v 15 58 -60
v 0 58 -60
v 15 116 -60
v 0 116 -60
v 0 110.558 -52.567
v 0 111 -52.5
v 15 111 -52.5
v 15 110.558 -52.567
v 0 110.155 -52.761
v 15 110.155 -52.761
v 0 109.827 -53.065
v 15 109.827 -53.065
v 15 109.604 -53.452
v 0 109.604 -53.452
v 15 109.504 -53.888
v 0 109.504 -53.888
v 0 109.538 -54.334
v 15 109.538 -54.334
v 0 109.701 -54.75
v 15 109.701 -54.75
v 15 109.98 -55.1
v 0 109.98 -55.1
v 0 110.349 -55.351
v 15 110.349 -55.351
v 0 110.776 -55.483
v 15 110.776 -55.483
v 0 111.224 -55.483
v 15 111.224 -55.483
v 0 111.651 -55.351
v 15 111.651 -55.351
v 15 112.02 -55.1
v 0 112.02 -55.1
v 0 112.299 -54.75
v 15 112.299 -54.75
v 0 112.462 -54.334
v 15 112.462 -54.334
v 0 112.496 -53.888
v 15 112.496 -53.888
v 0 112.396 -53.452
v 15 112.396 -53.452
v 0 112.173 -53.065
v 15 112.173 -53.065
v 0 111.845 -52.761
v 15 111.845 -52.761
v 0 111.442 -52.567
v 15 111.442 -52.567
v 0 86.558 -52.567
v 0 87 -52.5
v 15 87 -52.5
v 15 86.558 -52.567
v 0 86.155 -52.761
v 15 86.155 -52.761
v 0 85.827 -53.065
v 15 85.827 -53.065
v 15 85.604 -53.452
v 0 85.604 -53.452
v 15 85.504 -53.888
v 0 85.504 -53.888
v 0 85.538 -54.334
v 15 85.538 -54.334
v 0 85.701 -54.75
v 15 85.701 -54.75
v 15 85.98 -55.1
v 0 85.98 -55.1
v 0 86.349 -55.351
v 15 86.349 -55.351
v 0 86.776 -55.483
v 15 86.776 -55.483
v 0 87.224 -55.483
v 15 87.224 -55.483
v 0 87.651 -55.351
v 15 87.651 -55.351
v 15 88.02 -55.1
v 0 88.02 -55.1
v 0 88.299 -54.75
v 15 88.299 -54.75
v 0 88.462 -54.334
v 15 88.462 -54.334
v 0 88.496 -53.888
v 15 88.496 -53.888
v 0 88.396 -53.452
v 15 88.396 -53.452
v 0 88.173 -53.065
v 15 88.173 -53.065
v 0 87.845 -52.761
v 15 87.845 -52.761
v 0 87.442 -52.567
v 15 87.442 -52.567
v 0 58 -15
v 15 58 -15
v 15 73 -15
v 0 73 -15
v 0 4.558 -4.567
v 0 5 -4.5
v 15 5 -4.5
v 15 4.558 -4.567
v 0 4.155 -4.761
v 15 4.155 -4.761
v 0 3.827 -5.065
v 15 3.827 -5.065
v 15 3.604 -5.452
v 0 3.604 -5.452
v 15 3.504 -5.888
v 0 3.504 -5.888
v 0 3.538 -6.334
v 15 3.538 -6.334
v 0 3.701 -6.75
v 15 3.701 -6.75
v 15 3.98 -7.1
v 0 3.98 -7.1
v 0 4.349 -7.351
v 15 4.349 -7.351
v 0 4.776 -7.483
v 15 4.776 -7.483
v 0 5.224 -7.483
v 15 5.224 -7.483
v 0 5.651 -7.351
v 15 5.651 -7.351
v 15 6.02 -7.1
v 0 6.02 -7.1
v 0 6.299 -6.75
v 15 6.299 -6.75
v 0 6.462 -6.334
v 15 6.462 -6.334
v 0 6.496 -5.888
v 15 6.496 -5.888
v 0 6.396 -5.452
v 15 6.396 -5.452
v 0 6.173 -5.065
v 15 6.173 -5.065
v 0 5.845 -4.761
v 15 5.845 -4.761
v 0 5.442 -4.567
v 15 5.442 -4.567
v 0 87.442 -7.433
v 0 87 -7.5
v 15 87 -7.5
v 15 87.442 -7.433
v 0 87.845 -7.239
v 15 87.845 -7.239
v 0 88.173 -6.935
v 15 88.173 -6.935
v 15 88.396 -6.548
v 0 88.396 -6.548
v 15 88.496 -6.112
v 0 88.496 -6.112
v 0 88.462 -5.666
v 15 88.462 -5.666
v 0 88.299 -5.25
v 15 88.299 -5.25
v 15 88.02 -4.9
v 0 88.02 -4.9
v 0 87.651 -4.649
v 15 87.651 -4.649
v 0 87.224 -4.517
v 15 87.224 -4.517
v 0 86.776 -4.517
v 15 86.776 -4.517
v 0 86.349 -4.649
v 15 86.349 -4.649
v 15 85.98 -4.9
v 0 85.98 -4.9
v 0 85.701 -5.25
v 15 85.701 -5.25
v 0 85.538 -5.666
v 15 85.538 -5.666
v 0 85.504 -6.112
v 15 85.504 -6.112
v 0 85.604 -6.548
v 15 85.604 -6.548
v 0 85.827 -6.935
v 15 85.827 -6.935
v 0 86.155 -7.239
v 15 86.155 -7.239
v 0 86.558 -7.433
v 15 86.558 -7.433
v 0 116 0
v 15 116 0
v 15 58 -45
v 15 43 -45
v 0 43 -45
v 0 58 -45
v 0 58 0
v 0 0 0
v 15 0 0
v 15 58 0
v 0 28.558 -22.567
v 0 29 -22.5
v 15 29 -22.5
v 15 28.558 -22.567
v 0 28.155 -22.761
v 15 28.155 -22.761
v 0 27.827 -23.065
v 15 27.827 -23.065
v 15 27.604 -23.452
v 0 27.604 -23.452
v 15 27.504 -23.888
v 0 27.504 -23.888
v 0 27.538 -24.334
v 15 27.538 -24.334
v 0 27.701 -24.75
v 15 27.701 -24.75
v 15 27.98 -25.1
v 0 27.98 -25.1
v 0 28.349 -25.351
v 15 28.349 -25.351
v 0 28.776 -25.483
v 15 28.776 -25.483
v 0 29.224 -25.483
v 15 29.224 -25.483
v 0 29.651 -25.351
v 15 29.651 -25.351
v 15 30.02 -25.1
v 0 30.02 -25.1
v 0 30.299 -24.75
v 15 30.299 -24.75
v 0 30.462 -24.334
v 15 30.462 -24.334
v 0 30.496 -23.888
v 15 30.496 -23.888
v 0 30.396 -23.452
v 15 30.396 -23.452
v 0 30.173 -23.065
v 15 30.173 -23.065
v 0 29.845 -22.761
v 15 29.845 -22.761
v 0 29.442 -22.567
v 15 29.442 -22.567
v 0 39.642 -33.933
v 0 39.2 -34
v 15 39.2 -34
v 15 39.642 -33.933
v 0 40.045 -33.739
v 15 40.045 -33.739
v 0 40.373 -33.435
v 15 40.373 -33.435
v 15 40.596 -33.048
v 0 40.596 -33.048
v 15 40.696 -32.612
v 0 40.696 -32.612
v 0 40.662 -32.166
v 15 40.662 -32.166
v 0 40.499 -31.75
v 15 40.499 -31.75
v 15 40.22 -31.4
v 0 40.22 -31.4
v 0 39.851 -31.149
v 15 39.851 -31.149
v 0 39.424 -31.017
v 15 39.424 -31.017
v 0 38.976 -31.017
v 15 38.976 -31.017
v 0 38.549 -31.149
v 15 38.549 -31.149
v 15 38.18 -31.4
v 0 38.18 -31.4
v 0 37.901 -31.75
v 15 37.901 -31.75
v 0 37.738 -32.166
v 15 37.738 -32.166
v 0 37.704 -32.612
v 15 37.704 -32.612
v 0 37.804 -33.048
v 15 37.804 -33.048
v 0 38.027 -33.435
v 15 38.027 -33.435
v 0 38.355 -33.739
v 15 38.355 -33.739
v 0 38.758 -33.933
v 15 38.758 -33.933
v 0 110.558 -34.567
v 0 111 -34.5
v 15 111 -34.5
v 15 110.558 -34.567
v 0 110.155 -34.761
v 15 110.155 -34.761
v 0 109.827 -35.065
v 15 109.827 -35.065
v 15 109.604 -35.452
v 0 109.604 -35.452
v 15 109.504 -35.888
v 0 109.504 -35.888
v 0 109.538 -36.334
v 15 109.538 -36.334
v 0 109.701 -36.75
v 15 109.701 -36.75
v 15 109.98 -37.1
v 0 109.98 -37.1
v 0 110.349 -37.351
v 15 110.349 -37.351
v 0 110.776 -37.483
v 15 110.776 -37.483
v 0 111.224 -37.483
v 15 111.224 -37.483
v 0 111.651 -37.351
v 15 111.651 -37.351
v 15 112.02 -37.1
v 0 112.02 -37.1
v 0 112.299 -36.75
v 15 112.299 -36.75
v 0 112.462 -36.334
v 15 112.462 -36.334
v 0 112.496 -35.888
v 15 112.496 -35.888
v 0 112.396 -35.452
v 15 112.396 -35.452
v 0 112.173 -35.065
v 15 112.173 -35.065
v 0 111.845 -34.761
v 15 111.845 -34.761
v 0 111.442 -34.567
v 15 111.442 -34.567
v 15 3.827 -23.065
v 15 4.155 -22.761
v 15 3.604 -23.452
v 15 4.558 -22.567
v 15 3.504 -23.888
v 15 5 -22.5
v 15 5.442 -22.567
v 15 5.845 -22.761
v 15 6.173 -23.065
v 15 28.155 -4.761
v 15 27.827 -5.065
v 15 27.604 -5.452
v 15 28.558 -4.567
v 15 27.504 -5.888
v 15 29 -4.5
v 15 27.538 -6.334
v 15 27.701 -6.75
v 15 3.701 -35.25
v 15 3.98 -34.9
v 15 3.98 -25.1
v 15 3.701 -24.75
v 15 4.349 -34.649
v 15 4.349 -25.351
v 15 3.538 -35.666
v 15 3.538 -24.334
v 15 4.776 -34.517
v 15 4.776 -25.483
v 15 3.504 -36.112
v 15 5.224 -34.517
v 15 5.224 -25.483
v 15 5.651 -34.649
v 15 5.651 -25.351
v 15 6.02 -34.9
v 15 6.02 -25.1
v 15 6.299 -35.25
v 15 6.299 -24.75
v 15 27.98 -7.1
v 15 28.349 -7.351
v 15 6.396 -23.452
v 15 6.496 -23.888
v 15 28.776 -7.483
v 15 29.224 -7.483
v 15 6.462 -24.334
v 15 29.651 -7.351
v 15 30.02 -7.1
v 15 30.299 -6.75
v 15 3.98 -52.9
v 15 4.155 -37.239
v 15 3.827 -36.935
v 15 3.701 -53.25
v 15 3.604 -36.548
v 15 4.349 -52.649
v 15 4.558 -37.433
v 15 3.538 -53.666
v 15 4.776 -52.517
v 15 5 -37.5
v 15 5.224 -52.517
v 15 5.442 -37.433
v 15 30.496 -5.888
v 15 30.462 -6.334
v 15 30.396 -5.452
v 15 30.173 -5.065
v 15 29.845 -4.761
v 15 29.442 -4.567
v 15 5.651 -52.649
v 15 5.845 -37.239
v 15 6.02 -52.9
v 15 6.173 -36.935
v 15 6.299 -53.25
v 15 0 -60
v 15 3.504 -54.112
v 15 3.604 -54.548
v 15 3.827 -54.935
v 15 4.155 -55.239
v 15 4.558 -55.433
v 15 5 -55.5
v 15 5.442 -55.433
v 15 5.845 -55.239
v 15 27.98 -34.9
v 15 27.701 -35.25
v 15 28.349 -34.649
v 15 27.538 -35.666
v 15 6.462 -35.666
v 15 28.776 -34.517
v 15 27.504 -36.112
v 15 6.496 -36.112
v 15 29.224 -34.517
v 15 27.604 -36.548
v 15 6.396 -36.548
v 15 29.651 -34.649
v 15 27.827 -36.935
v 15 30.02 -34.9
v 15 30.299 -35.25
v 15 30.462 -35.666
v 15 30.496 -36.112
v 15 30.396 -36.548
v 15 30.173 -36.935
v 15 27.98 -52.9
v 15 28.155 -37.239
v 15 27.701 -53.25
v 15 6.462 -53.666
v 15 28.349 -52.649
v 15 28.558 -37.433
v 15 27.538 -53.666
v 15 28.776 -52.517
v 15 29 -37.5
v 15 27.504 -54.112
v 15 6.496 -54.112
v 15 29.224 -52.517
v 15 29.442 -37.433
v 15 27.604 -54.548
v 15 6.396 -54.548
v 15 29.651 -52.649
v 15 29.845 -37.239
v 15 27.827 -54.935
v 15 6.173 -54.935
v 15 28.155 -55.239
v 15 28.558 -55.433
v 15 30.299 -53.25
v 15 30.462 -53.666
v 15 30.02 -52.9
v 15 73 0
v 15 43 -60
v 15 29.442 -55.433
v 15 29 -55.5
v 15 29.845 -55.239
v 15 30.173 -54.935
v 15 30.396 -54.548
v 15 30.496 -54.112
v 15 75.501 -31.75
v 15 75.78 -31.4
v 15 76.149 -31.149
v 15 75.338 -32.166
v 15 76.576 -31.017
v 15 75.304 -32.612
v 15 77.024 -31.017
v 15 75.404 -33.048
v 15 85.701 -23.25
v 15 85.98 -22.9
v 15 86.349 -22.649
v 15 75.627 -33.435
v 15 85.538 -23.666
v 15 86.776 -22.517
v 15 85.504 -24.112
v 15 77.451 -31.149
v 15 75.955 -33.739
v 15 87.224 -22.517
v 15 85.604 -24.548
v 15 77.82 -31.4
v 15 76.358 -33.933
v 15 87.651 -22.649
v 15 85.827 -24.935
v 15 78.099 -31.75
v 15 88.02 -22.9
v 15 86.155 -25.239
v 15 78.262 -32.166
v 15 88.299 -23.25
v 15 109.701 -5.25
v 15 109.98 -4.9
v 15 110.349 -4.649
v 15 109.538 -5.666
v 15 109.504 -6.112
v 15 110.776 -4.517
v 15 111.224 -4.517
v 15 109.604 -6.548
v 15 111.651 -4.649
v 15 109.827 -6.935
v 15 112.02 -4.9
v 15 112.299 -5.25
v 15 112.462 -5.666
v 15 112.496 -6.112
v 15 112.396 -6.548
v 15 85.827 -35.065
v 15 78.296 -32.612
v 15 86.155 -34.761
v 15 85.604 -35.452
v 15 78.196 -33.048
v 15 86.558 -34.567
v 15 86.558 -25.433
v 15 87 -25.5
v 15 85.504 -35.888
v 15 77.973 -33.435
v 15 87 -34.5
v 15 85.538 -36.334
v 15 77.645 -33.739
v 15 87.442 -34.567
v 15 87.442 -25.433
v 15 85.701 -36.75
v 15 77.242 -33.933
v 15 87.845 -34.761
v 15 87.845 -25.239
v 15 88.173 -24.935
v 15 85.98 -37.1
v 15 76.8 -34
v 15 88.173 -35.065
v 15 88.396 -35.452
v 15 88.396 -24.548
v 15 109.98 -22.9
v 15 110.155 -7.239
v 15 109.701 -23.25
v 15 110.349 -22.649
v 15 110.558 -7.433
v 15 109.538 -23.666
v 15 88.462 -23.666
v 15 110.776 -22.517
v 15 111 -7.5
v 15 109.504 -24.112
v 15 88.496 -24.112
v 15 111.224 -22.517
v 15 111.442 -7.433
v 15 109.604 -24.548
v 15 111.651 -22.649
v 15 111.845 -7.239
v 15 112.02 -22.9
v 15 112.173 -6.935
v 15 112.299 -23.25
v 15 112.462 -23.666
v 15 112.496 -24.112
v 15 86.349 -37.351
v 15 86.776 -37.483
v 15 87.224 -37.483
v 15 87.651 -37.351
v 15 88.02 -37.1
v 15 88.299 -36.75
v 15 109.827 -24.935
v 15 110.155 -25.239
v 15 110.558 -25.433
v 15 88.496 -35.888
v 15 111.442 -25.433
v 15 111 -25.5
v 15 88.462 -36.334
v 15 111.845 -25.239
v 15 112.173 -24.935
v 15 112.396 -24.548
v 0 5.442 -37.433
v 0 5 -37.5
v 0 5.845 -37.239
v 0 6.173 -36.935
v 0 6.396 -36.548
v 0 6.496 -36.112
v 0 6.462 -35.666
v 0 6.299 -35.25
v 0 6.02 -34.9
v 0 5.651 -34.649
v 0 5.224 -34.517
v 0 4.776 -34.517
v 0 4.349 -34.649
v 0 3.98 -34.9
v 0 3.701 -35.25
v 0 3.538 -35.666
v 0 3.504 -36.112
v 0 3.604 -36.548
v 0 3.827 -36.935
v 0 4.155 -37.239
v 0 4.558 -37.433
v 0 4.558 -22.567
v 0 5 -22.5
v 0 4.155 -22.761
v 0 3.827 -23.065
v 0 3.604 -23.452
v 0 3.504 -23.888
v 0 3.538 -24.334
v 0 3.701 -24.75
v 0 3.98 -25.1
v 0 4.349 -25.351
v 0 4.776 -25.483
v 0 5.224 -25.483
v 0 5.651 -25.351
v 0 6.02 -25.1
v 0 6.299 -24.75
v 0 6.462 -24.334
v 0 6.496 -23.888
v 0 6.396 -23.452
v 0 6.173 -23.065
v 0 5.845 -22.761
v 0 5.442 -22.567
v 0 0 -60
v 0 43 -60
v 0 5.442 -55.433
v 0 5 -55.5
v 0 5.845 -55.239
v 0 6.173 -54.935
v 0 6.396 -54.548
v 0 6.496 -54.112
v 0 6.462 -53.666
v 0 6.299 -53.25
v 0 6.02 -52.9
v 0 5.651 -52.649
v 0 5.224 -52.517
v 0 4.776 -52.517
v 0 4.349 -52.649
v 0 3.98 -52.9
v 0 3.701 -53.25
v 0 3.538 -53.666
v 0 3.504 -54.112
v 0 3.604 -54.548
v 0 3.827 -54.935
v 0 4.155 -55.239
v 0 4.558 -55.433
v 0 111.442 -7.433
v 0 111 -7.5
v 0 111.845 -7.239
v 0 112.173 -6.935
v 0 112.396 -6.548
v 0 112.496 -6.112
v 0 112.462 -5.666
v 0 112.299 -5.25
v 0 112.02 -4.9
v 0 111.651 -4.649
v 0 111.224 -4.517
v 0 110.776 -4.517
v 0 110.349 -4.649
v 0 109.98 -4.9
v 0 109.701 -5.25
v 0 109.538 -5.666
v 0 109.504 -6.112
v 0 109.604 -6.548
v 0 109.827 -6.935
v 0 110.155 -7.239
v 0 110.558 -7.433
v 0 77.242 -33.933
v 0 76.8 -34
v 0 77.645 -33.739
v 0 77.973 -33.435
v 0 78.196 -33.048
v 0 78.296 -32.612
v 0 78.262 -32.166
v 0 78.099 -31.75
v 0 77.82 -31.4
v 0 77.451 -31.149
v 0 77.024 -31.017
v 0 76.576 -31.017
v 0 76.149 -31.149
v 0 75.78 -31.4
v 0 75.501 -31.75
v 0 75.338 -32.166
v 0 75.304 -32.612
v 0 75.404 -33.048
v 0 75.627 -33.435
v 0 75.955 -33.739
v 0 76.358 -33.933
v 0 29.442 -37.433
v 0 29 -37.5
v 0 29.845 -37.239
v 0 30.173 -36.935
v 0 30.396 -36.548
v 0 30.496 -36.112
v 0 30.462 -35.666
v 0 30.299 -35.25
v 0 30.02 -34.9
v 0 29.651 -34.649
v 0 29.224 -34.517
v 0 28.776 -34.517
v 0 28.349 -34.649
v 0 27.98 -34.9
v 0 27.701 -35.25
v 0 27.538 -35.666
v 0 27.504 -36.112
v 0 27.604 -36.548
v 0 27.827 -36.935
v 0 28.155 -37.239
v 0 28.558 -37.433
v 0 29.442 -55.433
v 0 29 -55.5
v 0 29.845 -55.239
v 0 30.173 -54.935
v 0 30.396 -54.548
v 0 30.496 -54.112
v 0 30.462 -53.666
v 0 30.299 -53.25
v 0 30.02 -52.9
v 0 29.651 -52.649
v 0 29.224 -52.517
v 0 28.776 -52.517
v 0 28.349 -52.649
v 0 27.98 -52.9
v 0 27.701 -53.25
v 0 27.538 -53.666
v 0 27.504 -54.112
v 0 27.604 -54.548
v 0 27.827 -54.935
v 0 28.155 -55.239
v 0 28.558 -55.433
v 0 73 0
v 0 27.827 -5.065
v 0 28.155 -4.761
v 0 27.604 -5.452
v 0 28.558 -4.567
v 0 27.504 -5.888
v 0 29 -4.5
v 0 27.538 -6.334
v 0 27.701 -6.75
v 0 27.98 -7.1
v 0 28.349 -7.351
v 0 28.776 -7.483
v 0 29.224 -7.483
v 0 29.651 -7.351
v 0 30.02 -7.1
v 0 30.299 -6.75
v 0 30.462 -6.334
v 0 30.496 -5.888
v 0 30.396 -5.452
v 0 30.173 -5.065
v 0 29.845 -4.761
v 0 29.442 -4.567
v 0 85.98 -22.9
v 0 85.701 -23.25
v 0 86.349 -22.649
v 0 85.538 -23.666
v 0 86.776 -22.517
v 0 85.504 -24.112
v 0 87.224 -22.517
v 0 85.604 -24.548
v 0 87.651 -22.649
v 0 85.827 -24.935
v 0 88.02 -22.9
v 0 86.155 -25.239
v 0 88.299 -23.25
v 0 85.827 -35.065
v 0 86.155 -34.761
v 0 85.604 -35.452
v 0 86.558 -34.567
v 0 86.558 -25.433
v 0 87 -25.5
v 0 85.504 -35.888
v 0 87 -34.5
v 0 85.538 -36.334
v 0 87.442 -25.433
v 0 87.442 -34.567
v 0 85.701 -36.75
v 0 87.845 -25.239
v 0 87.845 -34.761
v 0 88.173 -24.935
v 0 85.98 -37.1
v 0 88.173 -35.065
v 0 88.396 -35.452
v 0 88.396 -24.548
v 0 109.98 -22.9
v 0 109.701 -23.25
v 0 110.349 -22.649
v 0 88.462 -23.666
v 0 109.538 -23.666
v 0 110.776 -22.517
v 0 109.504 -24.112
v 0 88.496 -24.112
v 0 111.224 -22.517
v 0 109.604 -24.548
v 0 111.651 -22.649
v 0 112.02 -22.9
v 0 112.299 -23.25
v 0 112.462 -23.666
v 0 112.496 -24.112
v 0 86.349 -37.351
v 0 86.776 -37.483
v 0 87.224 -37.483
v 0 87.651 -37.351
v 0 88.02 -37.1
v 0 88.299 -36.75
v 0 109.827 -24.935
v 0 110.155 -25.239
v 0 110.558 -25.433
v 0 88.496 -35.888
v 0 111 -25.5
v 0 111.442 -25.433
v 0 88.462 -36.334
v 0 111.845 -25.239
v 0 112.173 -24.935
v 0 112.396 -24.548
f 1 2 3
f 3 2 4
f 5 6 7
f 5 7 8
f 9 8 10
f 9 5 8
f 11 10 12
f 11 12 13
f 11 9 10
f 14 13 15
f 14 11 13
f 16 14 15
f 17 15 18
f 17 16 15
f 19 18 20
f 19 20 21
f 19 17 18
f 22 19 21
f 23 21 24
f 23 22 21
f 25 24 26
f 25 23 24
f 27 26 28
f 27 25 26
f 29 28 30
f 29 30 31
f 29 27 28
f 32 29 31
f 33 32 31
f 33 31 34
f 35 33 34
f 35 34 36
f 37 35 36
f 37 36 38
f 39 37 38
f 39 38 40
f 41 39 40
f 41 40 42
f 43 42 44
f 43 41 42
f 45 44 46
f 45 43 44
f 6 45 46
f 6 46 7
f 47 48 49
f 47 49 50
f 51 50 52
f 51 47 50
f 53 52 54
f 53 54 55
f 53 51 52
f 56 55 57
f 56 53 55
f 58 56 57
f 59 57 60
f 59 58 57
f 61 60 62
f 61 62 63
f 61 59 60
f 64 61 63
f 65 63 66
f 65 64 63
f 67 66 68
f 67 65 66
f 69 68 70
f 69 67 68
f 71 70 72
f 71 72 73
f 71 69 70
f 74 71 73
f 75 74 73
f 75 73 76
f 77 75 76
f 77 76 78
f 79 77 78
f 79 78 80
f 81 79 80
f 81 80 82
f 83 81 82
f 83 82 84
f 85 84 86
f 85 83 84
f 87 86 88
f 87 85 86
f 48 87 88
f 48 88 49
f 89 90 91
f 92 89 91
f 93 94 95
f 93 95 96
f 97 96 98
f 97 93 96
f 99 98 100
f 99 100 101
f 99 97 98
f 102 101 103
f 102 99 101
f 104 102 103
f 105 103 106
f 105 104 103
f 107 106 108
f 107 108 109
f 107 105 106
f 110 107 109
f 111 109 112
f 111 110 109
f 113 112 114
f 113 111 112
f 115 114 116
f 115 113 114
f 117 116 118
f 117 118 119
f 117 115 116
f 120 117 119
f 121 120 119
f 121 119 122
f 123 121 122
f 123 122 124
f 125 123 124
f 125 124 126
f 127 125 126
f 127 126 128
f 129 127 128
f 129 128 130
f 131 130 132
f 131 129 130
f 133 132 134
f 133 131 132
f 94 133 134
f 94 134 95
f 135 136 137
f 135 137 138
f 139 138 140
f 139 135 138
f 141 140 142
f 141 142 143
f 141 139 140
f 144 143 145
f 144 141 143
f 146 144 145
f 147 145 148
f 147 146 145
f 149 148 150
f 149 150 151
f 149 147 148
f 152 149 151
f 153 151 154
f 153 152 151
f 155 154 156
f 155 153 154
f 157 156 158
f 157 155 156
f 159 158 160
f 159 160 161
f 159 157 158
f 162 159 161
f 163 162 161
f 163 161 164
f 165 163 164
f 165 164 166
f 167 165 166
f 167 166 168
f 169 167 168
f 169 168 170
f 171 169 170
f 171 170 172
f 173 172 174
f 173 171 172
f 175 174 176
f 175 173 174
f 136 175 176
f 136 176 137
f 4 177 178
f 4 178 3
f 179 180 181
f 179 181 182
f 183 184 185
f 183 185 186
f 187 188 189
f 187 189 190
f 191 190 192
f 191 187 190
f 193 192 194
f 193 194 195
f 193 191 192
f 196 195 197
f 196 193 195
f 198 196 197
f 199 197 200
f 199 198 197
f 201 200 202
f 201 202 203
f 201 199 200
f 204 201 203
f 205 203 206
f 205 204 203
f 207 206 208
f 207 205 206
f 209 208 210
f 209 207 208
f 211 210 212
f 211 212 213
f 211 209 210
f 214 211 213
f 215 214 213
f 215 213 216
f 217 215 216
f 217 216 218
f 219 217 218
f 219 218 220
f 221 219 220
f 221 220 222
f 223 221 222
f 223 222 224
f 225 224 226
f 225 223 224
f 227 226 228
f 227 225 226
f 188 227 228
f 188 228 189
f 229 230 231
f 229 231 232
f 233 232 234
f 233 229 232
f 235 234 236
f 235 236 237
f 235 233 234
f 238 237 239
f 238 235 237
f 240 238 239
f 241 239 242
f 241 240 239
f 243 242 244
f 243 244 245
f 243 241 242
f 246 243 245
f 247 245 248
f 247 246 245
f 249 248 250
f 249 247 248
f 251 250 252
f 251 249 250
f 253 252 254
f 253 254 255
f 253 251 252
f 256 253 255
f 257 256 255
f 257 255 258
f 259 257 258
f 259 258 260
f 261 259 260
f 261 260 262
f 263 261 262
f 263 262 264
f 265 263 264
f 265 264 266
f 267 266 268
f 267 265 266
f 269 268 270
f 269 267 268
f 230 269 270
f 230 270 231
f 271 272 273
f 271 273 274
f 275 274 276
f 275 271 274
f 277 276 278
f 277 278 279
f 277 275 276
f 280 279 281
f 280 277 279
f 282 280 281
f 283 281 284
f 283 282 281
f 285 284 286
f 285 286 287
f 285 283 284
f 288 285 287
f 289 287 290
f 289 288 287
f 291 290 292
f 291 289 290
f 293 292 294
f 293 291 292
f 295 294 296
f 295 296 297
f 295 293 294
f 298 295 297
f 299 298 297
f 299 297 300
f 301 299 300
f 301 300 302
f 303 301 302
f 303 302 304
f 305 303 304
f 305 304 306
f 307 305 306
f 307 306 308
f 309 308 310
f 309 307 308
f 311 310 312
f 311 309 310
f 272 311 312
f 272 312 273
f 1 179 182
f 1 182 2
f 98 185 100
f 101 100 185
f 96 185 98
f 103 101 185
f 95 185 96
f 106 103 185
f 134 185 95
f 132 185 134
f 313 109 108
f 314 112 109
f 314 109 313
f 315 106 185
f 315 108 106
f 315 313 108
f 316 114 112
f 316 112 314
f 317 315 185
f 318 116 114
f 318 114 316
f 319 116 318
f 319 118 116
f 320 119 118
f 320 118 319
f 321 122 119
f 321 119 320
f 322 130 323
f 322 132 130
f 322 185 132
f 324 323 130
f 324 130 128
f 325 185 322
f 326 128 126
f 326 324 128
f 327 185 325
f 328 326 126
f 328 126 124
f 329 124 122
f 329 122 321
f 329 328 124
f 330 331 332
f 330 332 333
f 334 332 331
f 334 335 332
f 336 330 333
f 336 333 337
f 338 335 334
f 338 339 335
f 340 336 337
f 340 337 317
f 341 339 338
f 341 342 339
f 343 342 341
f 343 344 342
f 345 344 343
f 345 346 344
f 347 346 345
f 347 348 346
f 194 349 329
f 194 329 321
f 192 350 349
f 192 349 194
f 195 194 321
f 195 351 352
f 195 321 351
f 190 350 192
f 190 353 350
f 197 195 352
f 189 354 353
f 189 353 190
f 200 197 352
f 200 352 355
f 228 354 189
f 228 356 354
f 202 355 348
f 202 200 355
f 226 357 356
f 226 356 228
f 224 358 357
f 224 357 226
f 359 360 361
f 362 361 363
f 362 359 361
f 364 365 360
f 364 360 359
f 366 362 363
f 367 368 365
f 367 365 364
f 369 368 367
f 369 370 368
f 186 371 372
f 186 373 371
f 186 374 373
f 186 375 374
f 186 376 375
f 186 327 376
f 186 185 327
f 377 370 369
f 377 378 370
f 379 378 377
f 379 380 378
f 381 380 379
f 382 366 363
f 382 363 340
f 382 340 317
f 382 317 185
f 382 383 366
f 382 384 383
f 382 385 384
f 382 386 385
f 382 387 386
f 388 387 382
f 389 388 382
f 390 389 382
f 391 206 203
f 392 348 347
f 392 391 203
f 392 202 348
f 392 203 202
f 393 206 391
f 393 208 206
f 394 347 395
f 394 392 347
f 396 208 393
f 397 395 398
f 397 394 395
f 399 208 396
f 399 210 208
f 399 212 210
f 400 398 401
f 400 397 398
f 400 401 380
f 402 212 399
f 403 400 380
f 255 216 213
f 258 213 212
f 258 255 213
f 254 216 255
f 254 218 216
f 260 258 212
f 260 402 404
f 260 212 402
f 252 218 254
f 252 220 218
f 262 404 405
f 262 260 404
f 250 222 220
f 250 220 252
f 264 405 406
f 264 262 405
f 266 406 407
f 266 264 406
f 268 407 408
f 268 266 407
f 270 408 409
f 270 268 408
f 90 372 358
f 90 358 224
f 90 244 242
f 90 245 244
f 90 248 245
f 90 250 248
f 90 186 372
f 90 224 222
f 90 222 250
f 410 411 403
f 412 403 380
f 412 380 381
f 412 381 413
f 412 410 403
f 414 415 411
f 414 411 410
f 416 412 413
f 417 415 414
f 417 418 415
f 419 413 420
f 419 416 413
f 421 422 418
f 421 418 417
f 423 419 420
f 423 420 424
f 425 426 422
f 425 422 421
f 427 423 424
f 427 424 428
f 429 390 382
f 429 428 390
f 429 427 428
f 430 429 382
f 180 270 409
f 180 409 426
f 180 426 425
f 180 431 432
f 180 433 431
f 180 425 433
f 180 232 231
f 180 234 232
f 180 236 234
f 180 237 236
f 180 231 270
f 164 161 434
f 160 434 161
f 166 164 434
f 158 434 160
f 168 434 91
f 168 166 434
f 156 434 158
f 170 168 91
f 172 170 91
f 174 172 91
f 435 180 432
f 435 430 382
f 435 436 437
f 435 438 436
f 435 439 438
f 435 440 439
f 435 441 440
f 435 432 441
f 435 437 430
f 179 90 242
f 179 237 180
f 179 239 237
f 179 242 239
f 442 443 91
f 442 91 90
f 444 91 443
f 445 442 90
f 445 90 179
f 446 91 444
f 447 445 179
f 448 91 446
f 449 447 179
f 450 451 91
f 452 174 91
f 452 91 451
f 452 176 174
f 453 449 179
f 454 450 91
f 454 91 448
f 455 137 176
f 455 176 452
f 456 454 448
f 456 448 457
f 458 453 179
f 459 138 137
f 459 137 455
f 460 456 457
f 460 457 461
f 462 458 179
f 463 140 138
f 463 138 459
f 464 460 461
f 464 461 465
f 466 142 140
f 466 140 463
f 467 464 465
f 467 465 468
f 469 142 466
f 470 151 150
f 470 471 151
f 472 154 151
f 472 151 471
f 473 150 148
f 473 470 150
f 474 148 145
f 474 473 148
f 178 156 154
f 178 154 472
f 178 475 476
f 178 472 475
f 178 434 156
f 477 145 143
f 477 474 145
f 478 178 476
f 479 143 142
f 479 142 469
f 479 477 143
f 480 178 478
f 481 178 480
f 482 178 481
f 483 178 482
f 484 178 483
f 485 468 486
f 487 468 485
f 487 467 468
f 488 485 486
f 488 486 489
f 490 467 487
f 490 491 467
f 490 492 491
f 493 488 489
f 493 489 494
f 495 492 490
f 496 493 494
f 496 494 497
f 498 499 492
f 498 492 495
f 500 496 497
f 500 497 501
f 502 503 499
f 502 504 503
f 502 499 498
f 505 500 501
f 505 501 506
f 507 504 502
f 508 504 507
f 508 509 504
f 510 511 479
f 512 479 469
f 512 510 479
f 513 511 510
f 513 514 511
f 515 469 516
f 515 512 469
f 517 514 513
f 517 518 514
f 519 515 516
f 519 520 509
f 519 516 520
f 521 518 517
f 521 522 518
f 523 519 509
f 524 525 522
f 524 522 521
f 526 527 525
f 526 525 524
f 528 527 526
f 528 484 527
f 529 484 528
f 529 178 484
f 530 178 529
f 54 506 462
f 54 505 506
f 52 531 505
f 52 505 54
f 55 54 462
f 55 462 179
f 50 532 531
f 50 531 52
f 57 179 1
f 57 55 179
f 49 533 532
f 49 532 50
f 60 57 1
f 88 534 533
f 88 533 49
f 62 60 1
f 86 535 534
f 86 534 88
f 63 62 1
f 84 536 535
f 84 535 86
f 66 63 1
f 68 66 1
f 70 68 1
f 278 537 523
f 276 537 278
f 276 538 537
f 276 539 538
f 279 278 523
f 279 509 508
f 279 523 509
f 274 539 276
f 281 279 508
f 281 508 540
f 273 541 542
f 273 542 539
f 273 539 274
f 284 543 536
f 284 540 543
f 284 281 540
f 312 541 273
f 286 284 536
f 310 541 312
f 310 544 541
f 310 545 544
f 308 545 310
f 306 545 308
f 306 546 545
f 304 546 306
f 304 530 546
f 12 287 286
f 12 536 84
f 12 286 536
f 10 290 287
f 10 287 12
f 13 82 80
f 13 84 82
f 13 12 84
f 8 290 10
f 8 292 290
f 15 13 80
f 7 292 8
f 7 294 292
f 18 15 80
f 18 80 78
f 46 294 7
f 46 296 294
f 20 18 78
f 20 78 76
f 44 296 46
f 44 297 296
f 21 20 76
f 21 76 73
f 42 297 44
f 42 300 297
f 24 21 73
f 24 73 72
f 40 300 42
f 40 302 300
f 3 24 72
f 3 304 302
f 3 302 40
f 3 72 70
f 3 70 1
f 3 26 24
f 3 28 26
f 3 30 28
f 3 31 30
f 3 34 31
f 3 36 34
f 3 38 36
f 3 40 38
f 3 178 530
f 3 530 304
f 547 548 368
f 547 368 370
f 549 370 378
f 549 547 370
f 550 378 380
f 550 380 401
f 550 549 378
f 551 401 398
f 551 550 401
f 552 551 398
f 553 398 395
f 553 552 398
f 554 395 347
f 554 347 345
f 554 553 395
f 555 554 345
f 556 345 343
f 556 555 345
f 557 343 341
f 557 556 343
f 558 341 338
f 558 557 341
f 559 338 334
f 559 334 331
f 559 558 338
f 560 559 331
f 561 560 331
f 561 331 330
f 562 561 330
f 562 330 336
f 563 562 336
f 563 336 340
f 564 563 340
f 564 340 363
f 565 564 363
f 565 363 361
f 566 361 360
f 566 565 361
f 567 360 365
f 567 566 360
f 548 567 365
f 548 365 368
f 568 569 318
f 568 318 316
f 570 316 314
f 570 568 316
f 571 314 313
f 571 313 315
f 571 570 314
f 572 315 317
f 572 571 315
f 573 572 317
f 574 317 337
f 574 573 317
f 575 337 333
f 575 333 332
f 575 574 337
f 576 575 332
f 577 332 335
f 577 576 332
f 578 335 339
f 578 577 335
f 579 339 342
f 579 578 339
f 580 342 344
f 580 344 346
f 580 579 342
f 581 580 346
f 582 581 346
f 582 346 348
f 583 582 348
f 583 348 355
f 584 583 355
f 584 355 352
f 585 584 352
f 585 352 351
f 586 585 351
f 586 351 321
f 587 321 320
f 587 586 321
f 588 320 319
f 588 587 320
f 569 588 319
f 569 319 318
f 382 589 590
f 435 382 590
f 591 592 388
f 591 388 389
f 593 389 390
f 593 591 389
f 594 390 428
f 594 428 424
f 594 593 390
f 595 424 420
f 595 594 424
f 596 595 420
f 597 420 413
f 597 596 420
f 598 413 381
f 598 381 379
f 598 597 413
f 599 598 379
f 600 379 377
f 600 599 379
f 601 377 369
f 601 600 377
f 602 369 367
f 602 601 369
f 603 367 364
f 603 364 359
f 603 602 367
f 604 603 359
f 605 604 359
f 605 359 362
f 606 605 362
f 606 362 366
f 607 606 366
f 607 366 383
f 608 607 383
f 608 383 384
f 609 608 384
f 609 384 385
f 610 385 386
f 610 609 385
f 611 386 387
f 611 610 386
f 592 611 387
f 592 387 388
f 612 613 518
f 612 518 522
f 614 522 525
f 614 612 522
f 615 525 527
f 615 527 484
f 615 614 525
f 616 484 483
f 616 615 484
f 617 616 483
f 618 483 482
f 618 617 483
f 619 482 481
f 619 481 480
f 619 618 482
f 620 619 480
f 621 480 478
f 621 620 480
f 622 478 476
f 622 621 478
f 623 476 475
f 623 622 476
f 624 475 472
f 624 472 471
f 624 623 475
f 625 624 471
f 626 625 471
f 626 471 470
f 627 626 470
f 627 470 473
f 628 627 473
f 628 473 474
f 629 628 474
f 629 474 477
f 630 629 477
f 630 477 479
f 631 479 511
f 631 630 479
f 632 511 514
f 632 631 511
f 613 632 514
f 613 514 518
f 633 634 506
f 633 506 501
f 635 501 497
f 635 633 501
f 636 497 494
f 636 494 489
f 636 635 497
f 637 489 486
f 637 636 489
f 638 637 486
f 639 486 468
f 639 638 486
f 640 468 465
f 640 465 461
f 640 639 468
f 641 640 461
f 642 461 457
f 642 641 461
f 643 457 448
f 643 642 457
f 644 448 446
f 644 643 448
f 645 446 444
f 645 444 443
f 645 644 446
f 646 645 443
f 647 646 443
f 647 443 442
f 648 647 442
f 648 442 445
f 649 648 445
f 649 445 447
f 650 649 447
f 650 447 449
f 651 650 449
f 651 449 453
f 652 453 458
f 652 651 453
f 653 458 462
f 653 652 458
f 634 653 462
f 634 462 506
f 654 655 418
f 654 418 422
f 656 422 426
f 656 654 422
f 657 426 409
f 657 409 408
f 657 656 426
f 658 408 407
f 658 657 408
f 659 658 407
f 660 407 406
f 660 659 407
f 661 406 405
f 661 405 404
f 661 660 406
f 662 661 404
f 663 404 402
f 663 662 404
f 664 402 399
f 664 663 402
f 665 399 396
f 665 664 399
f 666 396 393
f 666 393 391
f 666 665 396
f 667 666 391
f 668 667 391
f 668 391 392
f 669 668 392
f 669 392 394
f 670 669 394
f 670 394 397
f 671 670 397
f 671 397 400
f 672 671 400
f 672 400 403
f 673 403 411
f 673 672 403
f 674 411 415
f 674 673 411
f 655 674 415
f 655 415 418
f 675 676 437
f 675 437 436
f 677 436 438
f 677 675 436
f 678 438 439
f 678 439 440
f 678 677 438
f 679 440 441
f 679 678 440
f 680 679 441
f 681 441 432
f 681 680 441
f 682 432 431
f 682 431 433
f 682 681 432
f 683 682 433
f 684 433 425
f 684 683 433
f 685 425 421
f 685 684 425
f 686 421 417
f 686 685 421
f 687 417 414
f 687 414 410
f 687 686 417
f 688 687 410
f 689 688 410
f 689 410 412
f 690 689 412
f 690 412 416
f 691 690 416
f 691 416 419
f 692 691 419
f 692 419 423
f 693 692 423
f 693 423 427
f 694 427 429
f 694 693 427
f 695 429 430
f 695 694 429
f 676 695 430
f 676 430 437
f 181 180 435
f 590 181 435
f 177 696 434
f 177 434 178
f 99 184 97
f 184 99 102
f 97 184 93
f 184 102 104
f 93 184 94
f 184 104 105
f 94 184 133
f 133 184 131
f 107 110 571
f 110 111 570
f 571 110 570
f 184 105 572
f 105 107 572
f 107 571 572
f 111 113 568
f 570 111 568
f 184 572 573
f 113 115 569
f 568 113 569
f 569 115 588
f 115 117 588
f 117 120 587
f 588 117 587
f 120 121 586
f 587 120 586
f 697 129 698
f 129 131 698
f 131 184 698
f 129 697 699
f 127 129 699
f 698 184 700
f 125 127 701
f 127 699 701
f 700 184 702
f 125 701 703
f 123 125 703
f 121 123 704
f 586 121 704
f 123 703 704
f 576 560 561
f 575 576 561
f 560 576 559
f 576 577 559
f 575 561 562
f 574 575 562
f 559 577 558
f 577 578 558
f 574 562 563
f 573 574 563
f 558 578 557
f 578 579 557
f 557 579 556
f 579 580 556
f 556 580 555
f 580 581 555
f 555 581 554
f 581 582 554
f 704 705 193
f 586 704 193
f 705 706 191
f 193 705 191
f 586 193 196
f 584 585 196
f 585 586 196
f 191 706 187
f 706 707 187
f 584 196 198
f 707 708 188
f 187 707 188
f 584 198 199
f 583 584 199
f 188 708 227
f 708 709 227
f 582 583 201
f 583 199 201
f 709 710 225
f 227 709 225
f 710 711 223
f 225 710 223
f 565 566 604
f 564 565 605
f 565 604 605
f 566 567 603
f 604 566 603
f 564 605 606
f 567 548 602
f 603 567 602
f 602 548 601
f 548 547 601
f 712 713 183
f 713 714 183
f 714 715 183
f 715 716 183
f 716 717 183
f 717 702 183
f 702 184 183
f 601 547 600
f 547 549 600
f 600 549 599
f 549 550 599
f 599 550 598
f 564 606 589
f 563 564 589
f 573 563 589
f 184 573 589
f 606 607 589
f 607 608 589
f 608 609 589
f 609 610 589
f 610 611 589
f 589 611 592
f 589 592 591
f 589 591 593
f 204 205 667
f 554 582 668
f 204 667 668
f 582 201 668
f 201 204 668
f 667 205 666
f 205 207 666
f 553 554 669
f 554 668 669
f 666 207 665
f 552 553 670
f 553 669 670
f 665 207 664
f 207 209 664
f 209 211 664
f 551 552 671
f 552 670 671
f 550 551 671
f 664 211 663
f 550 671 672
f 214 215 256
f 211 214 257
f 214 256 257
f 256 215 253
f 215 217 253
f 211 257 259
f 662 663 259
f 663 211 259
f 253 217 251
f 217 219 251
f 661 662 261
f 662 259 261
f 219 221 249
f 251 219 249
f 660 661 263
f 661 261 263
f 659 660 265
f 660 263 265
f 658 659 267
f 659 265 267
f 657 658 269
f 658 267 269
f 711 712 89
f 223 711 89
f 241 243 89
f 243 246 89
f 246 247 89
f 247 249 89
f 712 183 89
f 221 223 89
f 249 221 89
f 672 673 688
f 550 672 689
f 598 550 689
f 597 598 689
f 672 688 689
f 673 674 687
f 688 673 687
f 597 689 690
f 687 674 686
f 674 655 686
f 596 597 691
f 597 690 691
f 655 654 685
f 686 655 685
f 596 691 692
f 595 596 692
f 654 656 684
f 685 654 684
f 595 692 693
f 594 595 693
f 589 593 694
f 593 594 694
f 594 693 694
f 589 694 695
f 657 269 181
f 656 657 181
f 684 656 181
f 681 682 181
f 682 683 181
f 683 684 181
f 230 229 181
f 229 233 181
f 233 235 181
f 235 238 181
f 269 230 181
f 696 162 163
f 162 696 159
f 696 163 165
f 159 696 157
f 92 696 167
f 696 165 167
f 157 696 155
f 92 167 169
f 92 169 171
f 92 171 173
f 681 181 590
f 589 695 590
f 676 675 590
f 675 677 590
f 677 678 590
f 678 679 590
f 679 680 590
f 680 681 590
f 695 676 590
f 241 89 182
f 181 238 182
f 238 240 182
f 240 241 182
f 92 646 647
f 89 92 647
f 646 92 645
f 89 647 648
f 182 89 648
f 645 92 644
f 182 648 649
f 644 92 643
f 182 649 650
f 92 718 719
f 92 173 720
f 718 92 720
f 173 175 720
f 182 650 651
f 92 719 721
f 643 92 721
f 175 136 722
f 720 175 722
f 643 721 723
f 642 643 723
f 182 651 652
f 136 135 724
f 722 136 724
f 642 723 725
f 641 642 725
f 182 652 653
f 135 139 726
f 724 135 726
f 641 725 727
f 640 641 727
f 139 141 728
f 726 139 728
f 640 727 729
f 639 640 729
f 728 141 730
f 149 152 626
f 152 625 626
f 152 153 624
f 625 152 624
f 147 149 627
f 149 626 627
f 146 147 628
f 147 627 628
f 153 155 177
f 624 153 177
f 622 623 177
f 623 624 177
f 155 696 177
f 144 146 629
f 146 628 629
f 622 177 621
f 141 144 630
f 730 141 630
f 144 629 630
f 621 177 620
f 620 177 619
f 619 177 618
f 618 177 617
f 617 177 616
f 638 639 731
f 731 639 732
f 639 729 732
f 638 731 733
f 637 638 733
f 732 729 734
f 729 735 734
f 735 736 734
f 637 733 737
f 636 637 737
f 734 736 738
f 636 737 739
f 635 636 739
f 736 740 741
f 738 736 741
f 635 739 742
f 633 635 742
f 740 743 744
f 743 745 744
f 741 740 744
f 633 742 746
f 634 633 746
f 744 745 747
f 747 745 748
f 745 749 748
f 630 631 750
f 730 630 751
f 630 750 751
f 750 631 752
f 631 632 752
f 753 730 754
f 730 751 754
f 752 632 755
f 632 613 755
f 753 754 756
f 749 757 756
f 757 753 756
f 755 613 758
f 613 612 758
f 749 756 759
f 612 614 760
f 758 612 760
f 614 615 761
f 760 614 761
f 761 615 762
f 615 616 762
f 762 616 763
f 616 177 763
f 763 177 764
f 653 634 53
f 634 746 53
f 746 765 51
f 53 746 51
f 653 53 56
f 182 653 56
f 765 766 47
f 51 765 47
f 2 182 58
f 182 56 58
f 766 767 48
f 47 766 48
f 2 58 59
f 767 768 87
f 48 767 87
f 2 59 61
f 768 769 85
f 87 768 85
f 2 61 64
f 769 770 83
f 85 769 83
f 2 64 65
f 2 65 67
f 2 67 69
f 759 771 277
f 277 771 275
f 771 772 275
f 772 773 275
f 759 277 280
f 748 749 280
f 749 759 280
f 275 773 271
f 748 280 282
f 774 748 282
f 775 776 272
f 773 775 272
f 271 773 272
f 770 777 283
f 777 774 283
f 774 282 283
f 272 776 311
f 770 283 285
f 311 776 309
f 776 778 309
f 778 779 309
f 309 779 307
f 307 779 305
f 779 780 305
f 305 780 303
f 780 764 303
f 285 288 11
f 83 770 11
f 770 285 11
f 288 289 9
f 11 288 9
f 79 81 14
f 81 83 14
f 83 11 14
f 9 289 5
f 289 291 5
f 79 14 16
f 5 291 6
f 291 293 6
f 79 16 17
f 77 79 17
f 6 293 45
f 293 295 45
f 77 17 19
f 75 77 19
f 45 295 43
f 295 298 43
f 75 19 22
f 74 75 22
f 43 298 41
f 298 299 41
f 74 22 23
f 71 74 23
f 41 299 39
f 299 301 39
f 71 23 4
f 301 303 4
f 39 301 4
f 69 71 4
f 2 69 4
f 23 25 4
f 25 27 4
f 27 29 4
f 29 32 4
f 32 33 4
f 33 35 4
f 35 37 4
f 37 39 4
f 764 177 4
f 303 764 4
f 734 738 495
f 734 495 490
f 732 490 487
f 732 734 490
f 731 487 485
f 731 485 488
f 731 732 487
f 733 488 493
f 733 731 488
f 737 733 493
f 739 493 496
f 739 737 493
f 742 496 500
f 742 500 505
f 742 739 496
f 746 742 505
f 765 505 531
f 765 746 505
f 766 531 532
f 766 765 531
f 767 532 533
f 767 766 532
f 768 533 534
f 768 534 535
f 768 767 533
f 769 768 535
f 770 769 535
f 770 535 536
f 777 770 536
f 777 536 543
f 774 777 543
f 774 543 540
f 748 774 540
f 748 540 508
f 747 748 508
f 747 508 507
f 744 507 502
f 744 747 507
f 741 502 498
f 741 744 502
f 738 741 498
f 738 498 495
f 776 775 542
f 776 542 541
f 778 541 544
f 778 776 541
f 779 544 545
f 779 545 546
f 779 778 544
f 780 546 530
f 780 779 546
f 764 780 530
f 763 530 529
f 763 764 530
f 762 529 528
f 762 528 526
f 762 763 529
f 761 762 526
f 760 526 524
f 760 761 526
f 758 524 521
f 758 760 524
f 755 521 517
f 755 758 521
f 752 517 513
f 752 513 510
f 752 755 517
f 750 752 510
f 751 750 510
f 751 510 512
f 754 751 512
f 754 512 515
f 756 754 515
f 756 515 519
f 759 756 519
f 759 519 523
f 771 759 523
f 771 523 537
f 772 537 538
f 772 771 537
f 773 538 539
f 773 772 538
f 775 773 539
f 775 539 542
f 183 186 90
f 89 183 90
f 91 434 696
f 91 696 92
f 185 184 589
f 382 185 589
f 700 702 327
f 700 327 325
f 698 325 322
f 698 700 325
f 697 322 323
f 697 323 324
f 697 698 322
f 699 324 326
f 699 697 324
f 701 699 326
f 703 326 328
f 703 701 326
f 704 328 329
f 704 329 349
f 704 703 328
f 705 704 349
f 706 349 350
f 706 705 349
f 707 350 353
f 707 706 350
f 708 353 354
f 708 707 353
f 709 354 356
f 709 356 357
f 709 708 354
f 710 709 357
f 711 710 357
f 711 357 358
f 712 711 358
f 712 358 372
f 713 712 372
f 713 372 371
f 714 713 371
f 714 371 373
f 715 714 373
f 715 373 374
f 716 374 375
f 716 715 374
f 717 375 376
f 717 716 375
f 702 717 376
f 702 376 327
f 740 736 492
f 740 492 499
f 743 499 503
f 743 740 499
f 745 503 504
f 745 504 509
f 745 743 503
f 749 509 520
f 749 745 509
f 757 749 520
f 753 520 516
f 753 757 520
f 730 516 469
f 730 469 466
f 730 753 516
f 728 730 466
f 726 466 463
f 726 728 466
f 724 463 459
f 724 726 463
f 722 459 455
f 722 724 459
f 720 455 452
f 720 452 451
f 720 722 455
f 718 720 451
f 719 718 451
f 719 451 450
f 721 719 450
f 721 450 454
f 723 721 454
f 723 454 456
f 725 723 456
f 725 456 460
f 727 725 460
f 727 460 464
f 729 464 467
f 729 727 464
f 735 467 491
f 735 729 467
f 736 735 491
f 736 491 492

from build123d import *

# Parameters (mm, degrees)
CROQUIS1_W              = 60
CROQUIS1_H              = 116
CROQUIS1_R              = 1.5
SALIENTE_EXTRUIR1_DEPTH = 15
CROQUIS2_W              = 15
CROQUIS2_H              = 15
CORTAR_EXTRUIR1_DEPTH   = 132.457217375


with BuildPart() as part:
    # Croquis1 → Saliente-Extruir1 (new body)
    with BuildSketch(Plane(origin=(0, 0, 0), x_dir=(0, 0, -1), z_dir=(1, 0, 0))):
        with Locations((30, 58)):
            Rectangle(CROQUIS1_W, CROQUIS1_H)
        with Locations((54, 5)):
            Circle(CROQUIS1_R, mode=Mode.SUBTRACT)
        with Locations((36, 5)):
            Circle(CROQUIS1_R, mode=Mode.SUBTRACT)
        with Locations((36, 29)):
            Circle(CROQUIS1_R, mode=Mode.SUBTRACT)
        with Locations((54, 29)):
            Circle(CROQUIS1_R, mode=Mode.SUBTRACT)
        with Locations(Location((24, 29, 0), (0, 0, 180))):
            Circle(CROQUIS1_R, mode=Mode.SUBTRACT)
        with Locations(Location((24, 5, 0), (0, 0, 180))):
            Circle(CROQUIS1_R, mode=Mode.SUBTRACT)
        with Locations(Location((6, 5, 0), (0, 0, 180))):
            Circle(CROQUIS1_R, mode=Mode.SUBTRACT)
        with Locations(Location((6, 29, 0), (0, 0, 180))):
            Circle(CROQUIS1_R, mode=Mode.SUBTRACT)
        with Locations((6, 87)):
            Circle(CROQUIS1_R, mode=Mode.SUBTRACT)
        with Locations((6, 111)):
            Circle(CROQUIS1_R, mode=Mode.SUBTRACT)
        with Locations((24, 111)):
            Circle(CROQUIS1_R, mode=Mode.SUBTRACT)
        with Locations((24, 87)):
            Circle(CROQUIS1_R, mode=Mode.SUBTRACT)
        with Locations(Location((36, 87, 0), (0, 0, 180))):
            Circle(CROQUIS1_R, mode=Mode.SUBTRACT)
        with Locations(Location((36, 111, 0), (0, 0, 180))):
            Circle(CROQUIS1_R, mode=Mode.SUBTRACT)
        with Locations(Location((54, 111, 0), (0, 0, 180))):
            Circle(CROQUIS1_R, mode=Mode.SUBTRACT)
        with Locations(Location((54, 87, 0), (0, 0, 180))):
            Circle(CROQUIS1_R, mode=Mode.SUBTRACT)
        with Locations((32.5, 76.8)):
            Circle(CROQUIS1_R, mode=Mode.SUBTRACT)
        with Locations((32.5, 39.2)):
            Circle(CROQUIS1_R, mode=Mode.SUBTRACT)
    extrude(amount=SALIENTE_EXTRUIR1_DEPTH)

    # Croquis2 → Cortar-Extruir1 (cut, through all)
    with BuildSketch(Plane(origin=(15, 0, 0), x_dir=(0, 0, -1), z_dir=(1, 0, 0))):
        with Locations((7.5, 65.5)):
            Rectangle(CROQUIS2_W, CROQUIS2_H)
        with Locations((52.5, 50.5)):
            Rectangle(CROQUIS2_W, CROQUIS2_H)
    extrude(amount=-CORTAR_EXTRUIR1_DEPTH, mode=Mode.SUBTRACT)


solid = part.part
